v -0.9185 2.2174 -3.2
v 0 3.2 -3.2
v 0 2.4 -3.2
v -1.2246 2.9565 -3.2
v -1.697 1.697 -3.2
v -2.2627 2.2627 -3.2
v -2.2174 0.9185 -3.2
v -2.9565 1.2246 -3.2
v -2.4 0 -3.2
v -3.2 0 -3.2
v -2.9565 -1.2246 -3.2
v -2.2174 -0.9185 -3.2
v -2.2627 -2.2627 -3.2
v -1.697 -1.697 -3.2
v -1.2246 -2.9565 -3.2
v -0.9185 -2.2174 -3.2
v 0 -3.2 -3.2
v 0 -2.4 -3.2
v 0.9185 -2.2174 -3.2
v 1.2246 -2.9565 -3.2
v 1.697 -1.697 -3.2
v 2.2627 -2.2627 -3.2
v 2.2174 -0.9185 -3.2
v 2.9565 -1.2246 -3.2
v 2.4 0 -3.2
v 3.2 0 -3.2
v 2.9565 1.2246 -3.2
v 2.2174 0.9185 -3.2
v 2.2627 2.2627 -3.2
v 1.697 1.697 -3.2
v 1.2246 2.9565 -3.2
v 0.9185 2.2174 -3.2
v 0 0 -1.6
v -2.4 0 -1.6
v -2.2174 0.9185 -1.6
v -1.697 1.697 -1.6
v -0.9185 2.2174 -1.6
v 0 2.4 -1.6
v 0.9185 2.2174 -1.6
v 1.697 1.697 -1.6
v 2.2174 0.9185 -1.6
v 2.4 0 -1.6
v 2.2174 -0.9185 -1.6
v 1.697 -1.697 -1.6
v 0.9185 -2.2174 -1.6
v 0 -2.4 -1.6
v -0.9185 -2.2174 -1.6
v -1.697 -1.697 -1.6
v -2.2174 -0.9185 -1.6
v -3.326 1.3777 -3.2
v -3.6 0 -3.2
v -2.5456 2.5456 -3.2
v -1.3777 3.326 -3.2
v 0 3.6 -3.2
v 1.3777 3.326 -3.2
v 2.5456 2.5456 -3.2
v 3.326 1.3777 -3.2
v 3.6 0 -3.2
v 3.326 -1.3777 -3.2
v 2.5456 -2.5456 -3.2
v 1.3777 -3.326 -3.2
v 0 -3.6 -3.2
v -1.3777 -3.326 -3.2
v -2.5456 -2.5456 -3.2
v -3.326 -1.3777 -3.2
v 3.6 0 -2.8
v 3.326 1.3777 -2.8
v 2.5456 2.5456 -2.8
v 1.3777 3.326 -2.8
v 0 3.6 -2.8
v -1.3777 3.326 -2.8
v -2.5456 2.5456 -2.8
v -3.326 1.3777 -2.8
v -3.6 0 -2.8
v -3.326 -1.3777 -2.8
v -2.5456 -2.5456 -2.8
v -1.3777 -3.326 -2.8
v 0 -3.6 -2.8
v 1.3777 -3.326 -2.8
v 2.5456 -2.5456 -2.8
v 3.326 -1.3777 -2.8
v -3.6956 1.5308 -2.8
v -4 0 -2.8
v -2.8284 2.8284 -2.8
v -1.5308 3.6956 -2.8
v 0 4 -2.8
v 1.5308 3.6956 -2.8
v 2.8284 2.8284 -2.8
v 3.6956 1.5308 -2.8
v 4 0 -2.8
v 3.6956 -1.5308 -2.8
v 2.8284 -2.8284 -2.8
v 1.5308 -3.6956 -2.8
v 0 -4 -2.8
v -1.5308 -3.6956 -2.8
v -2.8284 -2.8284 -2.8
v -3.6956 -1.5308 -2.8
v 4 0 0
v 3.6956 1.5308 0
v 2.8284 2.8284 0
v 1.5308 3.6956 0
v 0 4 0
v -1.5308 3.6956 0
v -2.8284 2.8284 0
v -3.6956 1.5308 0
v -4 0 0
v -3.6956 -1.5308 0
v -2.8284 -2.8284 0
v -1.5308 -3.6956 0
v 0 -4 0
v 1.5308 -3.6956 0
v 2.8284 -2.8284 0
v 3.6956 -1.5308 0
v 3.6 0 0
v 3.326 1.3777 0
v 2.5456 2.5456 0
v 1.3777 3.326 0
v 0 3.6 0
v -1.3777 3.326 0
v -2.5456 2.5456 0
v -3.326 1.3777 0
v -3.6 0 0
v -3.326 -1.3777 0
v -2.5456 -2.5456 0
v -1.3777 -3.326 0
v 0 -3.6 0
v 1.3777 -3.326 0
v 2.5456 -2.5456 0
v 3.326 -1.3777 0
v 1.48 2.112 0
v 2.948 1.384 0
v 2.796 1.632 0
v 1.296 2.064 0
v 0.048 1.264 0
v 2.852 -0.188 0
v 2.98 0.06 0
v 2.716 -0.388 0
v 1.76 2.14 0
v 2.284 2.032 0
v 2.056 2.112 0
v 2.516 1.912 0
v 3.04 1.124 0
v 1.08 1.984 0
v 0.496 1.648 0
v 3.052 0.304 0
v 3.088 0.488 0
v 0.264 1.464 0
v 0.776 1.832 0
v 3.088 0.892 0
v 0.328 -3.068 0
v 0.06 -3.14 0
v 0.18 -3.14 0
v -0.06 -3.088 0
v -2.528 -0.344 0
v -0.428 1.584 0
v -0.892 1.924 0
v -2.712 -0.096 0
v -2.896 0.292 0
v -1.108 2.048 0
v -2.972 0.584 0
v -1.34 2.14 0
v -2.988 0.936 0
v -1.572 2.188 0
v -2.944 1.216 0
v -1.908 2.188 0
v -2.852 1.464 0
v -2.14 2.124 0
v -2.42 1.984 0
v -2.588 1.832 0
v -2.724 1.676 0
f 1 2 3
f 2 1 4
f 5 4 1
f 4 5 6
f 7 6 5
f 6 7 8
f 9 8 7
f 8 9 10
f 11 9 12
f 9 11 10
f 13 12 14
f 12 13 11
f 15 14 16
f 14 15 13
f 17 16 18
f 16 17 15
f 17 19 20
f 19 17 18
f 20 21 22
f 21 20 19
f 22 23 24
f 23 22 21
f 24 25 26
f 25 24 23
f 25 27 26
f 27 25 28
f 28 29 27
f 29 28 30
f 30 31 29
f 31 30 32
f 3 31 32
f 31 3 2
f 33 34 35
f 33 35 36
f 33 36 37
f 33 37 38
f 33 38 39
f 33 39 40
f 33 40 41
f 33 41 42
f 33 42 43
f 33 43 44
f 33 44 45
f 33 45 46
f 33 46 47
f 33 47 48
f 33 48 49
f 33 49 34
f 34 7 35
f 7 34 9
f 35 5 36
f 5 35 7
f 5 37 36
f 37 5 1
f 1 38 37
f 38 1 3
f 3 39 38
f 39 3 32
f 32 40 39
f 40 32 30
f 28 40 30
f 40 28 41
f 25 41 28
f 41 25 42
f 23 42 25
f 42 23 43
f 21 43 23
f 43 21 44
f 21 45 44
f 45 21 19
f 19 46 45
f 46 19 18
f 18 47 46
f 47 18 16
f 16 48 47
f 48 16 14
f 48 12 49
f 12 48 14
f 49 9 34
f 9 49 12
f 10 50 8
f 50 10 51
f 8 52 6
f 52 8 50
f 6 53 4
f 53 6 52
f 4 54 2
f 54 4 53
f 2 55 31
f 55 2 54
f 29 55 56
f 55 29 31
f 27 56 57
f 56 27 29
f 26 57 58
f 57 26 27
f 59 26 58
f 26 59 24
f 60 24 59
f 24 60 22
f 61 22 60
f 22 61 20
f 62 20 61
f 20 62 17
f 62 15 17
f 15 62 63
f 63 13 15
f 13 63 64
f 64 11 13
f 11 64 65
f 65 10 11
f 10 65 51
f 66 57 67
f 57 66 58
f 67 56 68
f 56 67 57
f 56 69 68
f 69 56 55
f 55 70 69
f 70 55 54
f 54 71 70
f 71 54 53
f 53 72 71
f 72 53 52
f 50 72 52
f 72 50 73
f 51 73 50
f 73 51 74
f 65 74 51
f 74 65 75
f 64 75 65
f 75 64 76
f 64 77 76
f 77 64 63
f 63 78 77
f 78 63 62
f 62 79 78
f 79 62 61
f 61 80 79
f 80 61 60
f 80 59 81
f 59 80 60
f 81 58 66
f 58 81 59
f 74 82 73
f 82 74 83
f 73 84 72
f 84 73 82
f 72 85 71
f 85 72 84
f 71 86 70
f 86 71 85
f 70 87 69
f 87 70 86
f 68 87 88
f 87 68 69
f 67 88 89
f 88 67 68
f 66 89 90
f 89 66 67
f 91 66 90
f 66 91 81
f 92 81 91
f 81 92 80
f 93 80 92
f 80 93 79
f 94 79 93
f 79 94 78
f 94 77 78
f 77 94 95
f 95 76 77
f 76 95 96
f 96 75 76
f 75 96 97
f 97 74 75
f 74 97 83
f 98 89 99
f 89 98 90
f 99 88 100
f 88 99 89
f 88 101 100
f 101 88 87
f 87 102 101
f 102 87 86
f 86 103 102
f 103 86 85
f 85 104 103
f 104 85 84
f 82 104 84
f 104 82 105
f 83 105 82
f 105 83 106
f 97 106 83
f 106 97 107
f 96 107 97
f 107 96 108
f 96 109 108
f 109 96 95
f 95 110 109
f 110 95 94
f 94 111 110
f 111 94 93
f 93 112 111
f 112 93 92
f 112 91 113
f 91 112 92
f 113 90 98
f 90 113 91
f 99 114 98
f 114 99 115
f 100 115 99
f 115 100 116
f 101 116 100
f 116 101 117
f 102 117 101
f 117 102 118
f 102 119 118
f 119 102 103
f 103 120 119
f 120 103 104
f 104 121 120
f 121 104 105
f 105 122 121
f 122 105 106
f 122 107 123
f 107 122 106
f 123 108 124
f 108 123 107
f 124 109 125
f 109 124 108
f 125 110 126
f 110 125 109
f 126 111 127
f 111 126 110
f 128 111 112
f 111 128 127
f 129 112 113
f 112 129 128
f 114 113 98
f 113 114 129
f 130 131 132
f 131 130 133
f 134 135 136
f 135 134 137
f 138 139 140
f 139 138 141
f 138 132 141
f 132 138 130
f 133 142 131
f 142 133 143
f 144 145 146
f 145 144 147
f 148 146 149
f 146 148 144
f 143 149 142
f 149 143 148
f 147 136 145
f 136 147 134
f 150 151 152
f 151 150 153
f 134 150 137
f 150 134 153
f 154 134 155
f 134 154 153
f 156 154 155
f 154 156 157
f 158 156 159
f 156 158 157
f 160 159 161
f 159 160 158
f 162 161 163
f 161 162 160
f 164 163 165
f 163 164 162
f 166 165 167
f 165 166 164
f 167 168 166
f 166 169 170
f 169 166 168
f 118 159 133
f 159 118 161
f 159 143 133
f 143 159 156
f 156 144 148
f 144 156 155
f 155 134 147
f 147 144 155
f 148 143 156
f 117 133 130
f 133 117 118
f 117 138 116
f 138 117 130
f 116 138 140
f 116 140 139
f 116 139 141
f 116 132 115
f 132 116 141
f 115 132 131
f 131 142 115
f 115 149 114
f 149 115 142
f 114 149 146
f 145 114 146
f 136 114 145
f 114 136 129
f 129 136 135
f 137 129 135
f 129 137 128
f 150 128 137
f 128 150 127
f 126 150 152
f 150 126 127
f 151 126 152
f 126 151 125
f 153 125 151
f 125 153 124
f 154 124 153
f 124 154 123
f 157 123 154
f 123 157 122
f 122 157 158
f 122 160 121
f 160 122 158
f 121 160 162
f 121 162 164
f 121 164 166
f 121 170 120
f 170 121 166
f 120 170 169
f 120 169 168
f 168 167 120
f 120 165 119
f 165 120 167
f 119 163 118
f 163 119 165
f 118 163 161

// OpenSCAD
// file: ../p/4-4disc.scad
use <../lib.scad>
function ldraw_lib__4_4disc() = [
// 0 Disc 1.0
// 0 Name: 4-4disc.dat
// 0 Author: James Jessiman
// 0 !LDRAW_ORG Primitive UPDATE 2002-02
// 0 !LICENSE Licensed under CC BY 4.0 : see CAreadme.txt
// 
// 0 BFC CERTIFY CCW
  [0,"BFC","CERTIFY"],
  [0,"BFC","CCW"],
// 
// 0 !HISTORY 1998-12-15 [PTadmin] Official Update 1998-10
// 0 !HISTORY 2002-03-23 [sbliss] Added BFC statement
// 0 !HISTORY 2002-04-25 [PTadmin] Official Update 2002-02
// 0 !HISTORY 2007-06-24 [PTadmin] Header formatted for Contributor Agreement
// 0 !HISTORY 2008-07-01 [PTadmin] Official Update 2008-01
// 
// 
// 3 16 0 0 0 1 0 0 0.9239 0 0.3827
  [3,16,0,0,0,1,0,0,0.9239,0,0.3827],
// 3 16 0 0 0 0.9239 0 0.3827 0.7071 0 0.7071
  [3,16,0,0,0,0.9239,0,0.3827,0.7071,0,0.7071],
// 3 16 0 0 0 0.7071 0 0.7071 0.3827 0 0.9239
  [3,16,0,0,0,0.7071,0,0.7071,0.3827,0,0.9239],
// 3 16 0 0 0 0.3827 0 0.9239 0 0 1
  [3,16,0,0,0,0.3827,0,0.9239,0,0,1],
// 3 16 0 0 0 0 0 1 -0.3827 0 0.9239
  [3,16,0,0,0,0,0,1,-0.3827,0,0.9239],
// 3 16 0 0 0 -0.3827 0 0.9239 -0.7071 0 0.7071
  [3,16,0,0,0,-0.3827,0,0.9239,-0.7071,0,0.7071],
// 3 16 0 0 0 -0.7071 0 0.7071 -0.9239 0 0.3827
  [3,16,0,0,0,-0.7071,0,0.7071,-0.9239,0,0.3827],
// 3 16 0 0 0 -0.9239 0 0.3827 -1 0 -0
  [3,16,0,0,0,-0.9239,0,0.3827,-1,0,-0],
// 3 16 0 0 0 -1 0 -0 -0.9239 0 -0.3827
  [3,16,0,0,0,-1,0,-0,-0.9239,0,-0.3827],
// 3 16 0 0 0 -0.9239 0 -0.3827 -0.7071 0 -0.7071
  [3,16,0,0,0,-0.9239,0,-0.3827,-0.7071,0,-0.7071],
// 3 16 0 0 0 -0.7071 0 -0.7071 -0.3827 0 -0.9239
  [3,16,0,0,0,-0.7071,0,-0.7071,-0.3827,0,-0.9239],
// 3 16 0 0 0 -0.3827 0 -0.9239 0 0 -1
  [3,16,0,0,0,-0.3827,0,-0.9239,0,0,-1],
// 3 16 0 0 0 0 0 -1 0.3827 0 -0.9239
  [3,16,0,0,0,0,0,-1,0.3827,0,-0.9239],
// 3 16 0 0 0 0.3827 0 -0.9239 0.7071 0 -0.7071
  [3,16,0,0,0,0.3827,0,-0.9239,0.7071,0,-0.7071],
// 3 16 0 0 0 0.7071 0 -0.7071 0.9239 0 -0.3827
  [3,16,0,0,0,0.7071,0,-0.7071,0.9239,0,-0.3827],
// 3 16 0 0 0 0.9239 0 -0.3827 1 0 0
  [3,16,0,0,0,0.9239,0,-0.3827,1,0,0],
// 0
];
module ldraw_lib__4_4disc(step=0, col=false, unit=2/5, alt=false, line=0.2, solid=!$preview)
    makepoly(ldraw_lib__4_4disc(), step=step, col=col, unit=unit, alt=alt, line=line, solid=solid);
ldraw_lib__4_4disc(line=0.2);
// file: ../p/4-4ring3.scad
use <../lib.scad>
function ldraw_lib__4_4ring3() = [
// 0 Ring  3 x 1.0
// 0 Name: 4-4ring3.dat
// 0 Author: James Jessiman
// 0 !LDRAW_ORG Primitive UPDATE 2009-01
// 0 !LICENSE Licensed under CC BY 4.0 : see CAreadme.txt
// 
// 0 BFC CERTIFY CCW
  [0,"BFC","CERTIFY"],
  [0,"BFC","CCW"],
// 
// 0 !HISTORY 1998-12-15 [PTadmin] Official Update 1998-10
// 0 !HISTORY 2002-04-05 [hafhead] Added BFC statement
// 0 !HISTORY 2002-04-25 [PTadmin] Official Update 2002-02
// 0 !HISTORY 2007-06-24 [PTadmin] Header formatted for Contributor Agreement
// 0 !HISTORY 2008-07-01 [PTadmin] Official Update 2008-01
// 0 !HISTORY 2008-08-26 [cwdee] Switch polygon winding and rename
// 0 !HISTORY 2009-05-02 [PTadmin] Official Update 2009-01
// 
// 
// 4 16 -1.5308 0 3.6956 -1.1481 0 2.7717 0 0 3 0 0 4
  [4,16,-1.5308,0,3.6956,-1.1481,0,2.7717,0,0,3,0,0,4],
// 4 16 -2.8284 0 2.8284 -2.1213 0 2.1213 -1.1481 0 2.7717 -1.5308 0 3.6956
  [4,16,-2.8284,0,2.8284,-2.1213,0,2.1213,-1.1481,0,2.7717,-1.5308,0,3.6956],
// 4 16 -3.6956 0 1.5308 -2.7717 0 1.1481 -2.1213 0 2.1213 -2.8284 0 2.8284
  [4,16,-3.6956,0,1.5308,-2.7717,0,1.1481,-2.1213,0,2.1213,-2.8284,0,2.8284],
// 4 16 -4 0 0 -3 0 0 -2.7717 0 1.1481 -3.6956 0 1.5308
  [4,16,-4,0,0,-3,0,0,-2.7717,0,1.1481,-3.6956,0,1.5308],
// 4 16 -3.6956 0 -1.5308 -2.7717 0 -1.1481 -3 0 0 -4 0 0
  [4,16,-3.6956,0,-1.5308,-2.7717,0,-1.1481,-3,0,0,-4,0,0],
// 4 16 -2.8284 0 -2.8284 -2.1213 0 -2.1213 -2.7717 0 -1.1481 -3.6956 0 -1.5308
  [4,16,-2.8284,0,-2.8284,-2.1213,0,-2.1213,-2.7717,0,-1.1481,-3.6956,0,-1.5308],
// 4 16 -1.5308 0 -3.6956 -1.1481 0 -2.7717 -2.1213 0 -2.1213 -2.8284 0 -2.8284
  [4,16,-1.5308,0,-3.6956,-1.1481,0,-2.7717,-2.1213,0,-2.1213,-2.8284,0,-2.8284],
// 4 16 0 0 -4 0 0 -3 -1.1481 0 -2.7717 -1.5308 0 -3.6956
  [4,16,0,0,-4,0,0,-3,-1.1481,0,-2.7717,-1.5308,0,-3.6956],
// 4 16 1.5308 0 -3.6956 1.1481 0 -2.7717 0 0 -3 0 0 -4
  [4,16,1.5308,0,-3.6956,1.1481,0,-2.7717,0,0,-3,0,0,-4],
// 4 16 2.8284 0 -2.8284 2.1213 0 -2.1213 1.1481 0 -2.7717 1.5308 0 -3.6956
  [4,16,2.8284,0,-2.8284,2.1213,0,-2.1213,1.1481,0,-2.7717,1.5308,0,-3.6956],
// 4 16 3.6956 0 -1.5308 2.7717 0 -1.1481 2.1213 0 -2.1213 2.8284 0 -2.8284
  [4,16,3.6956,0,-1.5308,2.7717,0,-1.1481,2.1213,0,-2.1213,2.8284,0,-2.8284],
// 4 16 4 0 0 3 0 0 2.7717 0 -1.1481 3.6956 0 -1.5308
  [4,16,4,0,0,3,0,0,2.7717,0,-1.1481,3.6956,0,-1.5308],
// 4 16 3.6956 0 1.5308 2.7717 0 1.1481 3 0 0 4 0 0
  [4,16,3.6956,0,1.5308,2.7717,0,1.1481,3,0,0,4,0,0],
// 4 16 2.8284 0 2.8284 2.1213 0 2.1213 2.7717 0 1.1481 3.6956 0 1.5308
  [4,16,2.8284,0,2.8284,2.1213,0,2.1213,2.7717,0,1.1481,3.6956,0,1.5308],
// 4 16 1.5308 0 3.6956 1.1481 0 2.7717 2.1213 0 2.1213 2.8284 0 2.8284
  [4,16,1.5308,0,3.6956,1.1481,0,2.7717,2.1213,0,2.1213,2.8284,0,2.8284],
// 4 16 0 0 4 0 0 3 1.1481 0 2.7717 1.5308 0 3.6956
  [4,16,0,0,4,0,0,3,1.1481,0,2.7717,1.5308,0,3.6956],
// 0
];
module ldraw_lib__4_4ring3(step=0, col=false, unit=2/5, alt=false, line=0.2, solid=!$preview)
    makepoly(ldraw_lib__4_4ring3(), step=step, col=col, unit=unit, alt=alt, line=line, solid=solid);
ldraw_lib__4_4ring3(line=0.2);
// file: ../p/4-4cylc.scad
use <../lib.scad>
use <4-4cyli.scad>
use <4-4disc.scad>
use <4-4edge.scad>
function ldraw_lib__4_4cylc() = [
// 0 Cylinder Closed 1.0
// 0 Name: 4-4cylc.dat
// 0 Author: Alex Taylor [anathema]
// 0 !LDRAW_ORG Primitive UPDATE 2009-02
// 0 !LICENSE Licensed under CC BY 4.0 : see CAreadme.txt
// 
// 0 BFC CERTIFY CCW
  [0,"BFC","CERTIFY"],
  [0,"BFC","CCW"],
// 
// 0 !HISTORY 2008-12-29 [cwdee] Removed one disc
// 0 !HISTORY 2009-09-03 [PTadmin] Official Update 2009-02
// 
// 
// 1 16 0 0 0 1 0 0 0 1 0 0 0 1 4-4edge.dat
  [1,16,0,0,0,1,0,0,0,1,0,0,0,1, ldraw_lib__4_4edge()],
// 1 16 0 1 0 1 0 0 0 1 0 0 0 1 4-4edge.dat
  [1,16,0,1,0,1,0,0,0,1,0,0,0,1, ldraw_lib__4_4edge()],
// 1 16 0 0 0 1 0 0 0 1 0 0 0 1 4-4disc.dat
  [1,16,0,0,0,1,0,0,0,1,0,0,0,1, ldraw_lib__4_4disc()],
// 1 16 0 0 0 1 0 0 0 1 0 0 0 1 4-4cyli.dat
  [1,16,0,0,0,1,0,0,0,1,0,0,0,1, ldraw_lib__4_4cyli()],
// 0
];
module ldraw_lib__4_4cylc(step=0, col=false, unit=2/5, alt=false, line=0.2, solid=!$preview)
    makepoly(ldraw_lib__4_4cylc(), step=step, col=col, unit=unit, alt=alt, line=line, solid=solid);
ldraw_lib__4_4cylc(line=0.2);
// file: ../p/4-4edge.scad
use <../lib.scad>
function ldraw_lib__4_4edge() = [
// 0 Circle 1.0
// 0 Name: 4-4edge.dat
// 0 Author: James Jessiman
// 0 !LDRAW_ORG Primitive UPDATE 2017-01
// 0 !LICENSE Licensed under CC BY 4.0 : see CAreadme.txt
// 
// 0 BFC CERTIFY CCW
  [0,"BFC","CERTIFY"],
  [0,"BFC","CCW"],
// 
// 0 !HISTORY 1998-12-15 [PTadmin] Official Update 1998-10
// 0 !HISTORY 2005-12-28 [PTadmin] Official Update 2005-01
// 0 !HISTORY 2007-06-24 [PTadmin] Header formatted for Contributor Agreement
// 0 !HISTORY 2008-07-01 [PTadmin] Official Update 2008-01
// 0 !HISTORY 2017-01-15 [Steffen] BFCed
// 0 !HISTORY 2017-12-30 [PTadmin] Official Update 2017-01
// 
// 
// 2 24 1 0 0 0.9239 0 0.3827
  [2,24,1,0,0,0.9239,0,0.3827],
// 2 24 0.9239 0 0.3827 0.7071 0 0.7071
  [2,24,0.9239,0,0.3827,0.7071,0,0.7071],
// 2 24 0.7071 0 0.7071 0.3827 0 0.9239
  [2,24,0.7071,0,0.7071,0.3827,0,0.9239],
// 2 24 0.3827 0 0.9239 0 0 1
  [2,24,0.3827,0,0.9239,0,0,1],
// 2 24 0 0 1 -0.3827 0 0.9239
  [2,24,0,0,1,-0.3827,0,0.9239],
// 2 24 -0.3827 0 0.9239 -0.7071 0 0.7071
  [2,24,-0.3827,0,0.9239,-0.7071,0,0.7071],
// 2 24 -0.7071 0 0.7071 -0.9239 0 0.3827
  [2,24,-0.7071,0,0.7071,-0.9239,0,0.3827],
// 2 24 -0.9239 0 0.3827 -1 0 -0
  [2,24,-0.9239,0,0.3827,-1,0,-0],
// 2 24 -1 0 -0 -0.9239 0 -0.3827
  [2,24,-1,0,-0,-0.9239,0,-0.3827],
// 2 24 -0.9239 0 -0.3827 -0.7071 0 -0.7071
  [2,24,-0.9239,0,-0.3827,-0.7071,0,-0.7071],
// 2 24 -0.7071 0 -0.7071 -0.3827 0 -0.9239
  [2,24,-0.7071,0,-0.7071,-0.3827,0,-0.9239],
// 2 24 -0.3827 0 -0.9239 0 0 -1
  [2,24,-0.3827,0,-0.9239,0,0,-1],
// 2 24 0 0 -1 0.3827 0 -0.9239
  [2,24,0,0,-1,0.3827,0,-0.9239],
// 2 24 0.3827 0 -0.9239 0.7071 0 -0.7071
  [2,24,0.3827,0,-0.9239,0.7071,0,-0.7071],
// 2 24 0.7071 0 -0.7071 0.9239 0 -0.3827
  [2,24,0.7071,0,-0.7071,0.9239,0,-0.3827],
// 2 24 0.9239 0 -0.3827 1 0 0
  [2,24,0.9239,0,-0.3827,1,0,0],
];
module ldraw_lib__4_4edge(step=0, col=false, unit=2/5, alt=false, line=0.2, solid=!$preview)
    makepoly(ldraw_lib__4_4edge(), step=step, col=col, unit=unit, alt=alt, line=line, solid=solid);
ldraw_lib__4_4edge(line=0.2);
// file: ../p/4-4cyli.scad
use <../lib.scad>
function ldraw_lib__4_4cyli() = [
// 0 Cylinder 1.0
// 0 Name: 4-4cyli.dat
// 0 Author: James Jessiman
// 0 !LDRAW_ORG Primitive UPDATE 2005-01
// 0 !LICENSE Licensed under CC BY 4.0 : see CAreadme.txt
// 
// 0 BFC CERTIFY CCW
  [0,"BFC","CERTIFY"],
  [0,"BFC","CCW"],
// 
// 0 !HISTORY 1998-12-15 [PTadmin] Official Update 1998-10
// 0 !HISTORY 2002-03-23 [sbliss] Added BFC statement; merged headers from files in distributions LDraw 0.27 and Complete.
// 0 !HISTORY 2002-04-25 [PTadmin] Official Update 2002-02
// 0 !HISTORY 2004-12-14 [guyvivan] BFC CCW
// 0 !HISTORY 2005-12-28 [PTadmin] Official Update 2005-01
// 0 !HISTORY 2007-06-24 [PTadmin] Header formatted for Contributor Agreement
// 0 !HISTORY 2008-07-01 [PTadmin] Official Update 2008-01
// 
// 
// 4 16 1 1 0 0.9239 1 0.3827 0.9239 0 0.3827 1 0 0
  [4,16,1,1,0,0.9239,1,0.3827,0.9239,0,0.3827,1,0,0],
// 5 24 1 0 0 1 1 0 0.9239 0 0.3827 0.9239 0 -0.3827
  [5,24,1,0,0,1,1,0,0.9239,0,0.3827,0.9239,0,-0.3827],
// 4 16 0.9239 1 0.3827 0.7071 1 0.7071 0.7071 0 0.7071 0.9239 0 0.3827
  [4,16,0.9239,1,0.3827,0.7071,1,0.7071,0.7071,0,0.7071,0.9239,0,0.3827],
// 5 24 0.9239 0 0.3827 0.9239 1 0.3827 0.7071 0 0.7071 1 0 0
  [5,24,0.9239,0,0.3827,0.9239,1,0.3827,0.7071,0,0.7071,1,0,0],
// 4 16 0.7071 1 0.7071 0.3827 1 0.9239 0.3827 0 0.9239 0.7071 0 0.7071
  [4,16,0.7071,1,0.7071,0.3827,1,0.9239,0.3827,0,0.9239,0.7071,0,0.7071],
// 5 24 0.7071 0 0.7071 0.7071 1 0.7071 0.3827 0 0.9239 0.9239 0 0.3827
  [5,24,0.7071,0,0.7071,0.7071,1,0.7071,0.3827,0,0.9239,0.9239,0,0.3827],
// 4 16 0.3827 1 0.9239 0 1 1 0 0 1 0.3827 0 0.9239
  [4,16,0.3827,1,0.9239,0,1,1,0,0,1,0.3827,0,0.9239],
// 5 24 0.3827 0 0.9239 0.3827 1 0.9239 0 0 1 0.7071 0 0.7071
  [5,24,0.3827,0,0.9239,0.3827,1,0.9239,0,0,1,0.7071,0,0.7071],
// 4 16 0 1 1 -0.3827 1 0.9239 -0.3827 0 0.9239 0 0 1
  [4,16,0,1,1,-0.3827,1,0.9239,-0.3827,0,0.9239,0,0,1],
// 5 24 0 0 1 0 1 1 -0.3827 0 0.9239 0.3827 0 0.9239
  [5,24,0,0,1,0,1,1,-0.3827,0,0.9239,0.3827,0,0.9239],
// 4 16 -0.3827 1 0.9239 -0.7071 1 0.7071 -0.7071 0 0.7071 -0.3827 0 0.9239
  [4,16,-0.3827,1,0.9239,-0.7071,1,0.7071,-0.7071,0,0.7071,-0.3827,0,0.9239],
// 5 24 -0.3827 0 0.9239 -0.3827 1 0.9239 -0.7071 0 0.7071 0 0 1
  [5,24,-0.3827,0,0.9239,-0.3827,1,0.9239,-0.7071,0,0.7071,0,0,1],
// 4 16 -0.7071 1 0.7071 -0.9239 1 0.3827 -0.9239 0 0.3827 -0.7071 0 0.7071
  [4,16,-0.7071,1,0.7071,-0.9239,1,0.3827,-0.9239,0,0.3827,-0.7071,0,0.7071],
// 5 24 -0.7071 0 0.7071 -0.7071 1 0.7071 -0.9239 0 0.3827 -0.3827 0 0.9239
  [5,24,-0.7071,0,0.7071,-0.7071,1,0.7071,-0.9239,0,0.3827,-0.3827,0,0.9239],
// 4 16 -0.9239 1 0.3827 -1 1 0 -1 0 0 -0.9239 0 0.3827
  [4,16,-0.9239,1,0.3827,-1,1,0,-1,0,0,-0.9239,0,0.3827],
// 5 24 -0.9239 0 0.3827 -0.9239 1 0.3827 -1 0 0 -0.7071 0 0.7071
  [5,24,-0.9239,0,0.3827,-0.9239,1,0.3827,-1,0,0,-0.7071,0,0.7071],
// 4 16 -1 1 0 -0.9239 1 -0.3827 -0.9239 0 -0.3827 -1 0 0
  [4,16,-1,1,0,-0.9239,1,-0.3827,-0.9239,0,-0.3827,-1,0,0],
// 5 24 -1 0 0 -1 1 0 -0.9239 0 -0.3827 -0.9239 0 0.3827
  [5,24,-1,0,0,-1,1,0,-0.9239,0,-0.3827,-0.9239,0,0.3827],
// 4 16 -0.9239 1 -0.3827 -0.7071 1 -0.7071 -0.7071 0 -0.7071 -0.9239 0 -0.3827
  [4,16,-0.9239,1,-0.3827,-0.7071,1,-0.7071,-0.7071,0,-0.7071,-0.9239,0,-0.3827],
// 5 24 -0.9239 0 -0.3827 -0.9239 1 -0.3827 -0.7071 0 -0.7071 -1 0 0
  [5,24,-0.9239,0,-0.3827,-0.9239,1,-0.3827,-0.7071,0,-0.7071,-1,0,0],
// 4 16 -0.7071 1 -0.7071 -0.3827 1 -0.9239 -0.3827 0 -0.9239 -0.7071 0 -0.7071
  [4,16,-0.7071,1,-0.7071,-0.3827,1,-0.9239,-0.3827,0,-0.9239,-0.7071,0,-0.7071],
// 5 24 -0.7071 0 -0.7071 -0.7071 1 -0.7071 -0.3827 0 -0.9239 -0.9239 0 -0.3827
  [5,24,-0.7071,0,-0.7071,-0.7071,1,-0.7071,-0.3827,0,-0.9239,-0.9239,0,-0.3827],
// 4 16 -0.3827 1 -0.9239 0 1 -1 0 0 -1 -0.3827 0 -0.9239
  [4,16,-0.3827,1,-0.9239,0,1,-1,0,0,-1,-0.3827,0,-0.9239],
// 5 24 -0.3827 0 -0.9239 -0.3827 1 -0.9239 0 0 -1 -0.7071 0 -0.7071
  [5,24,-0.3827,0,-0.9239,-0.3827,1,-0.9239,0,0,-1,-0.7071,0,-0.7071],
// 4 16 0 1 -1 0.3827 1 -0.9239 0.3827 0 -0.9239 0 0 -1
  [4,16,0,1,-1,0.3827,1,-0.9239,0.3827,0,-0.9239,0,0,-1],
// 5 24 0 0 -1 0 1 -1 0.3827 0 -0.9239 -0.3827 0 -0.9239
  [5,24,0,0,-1,0,1,-1,0.3827,0,-0.9239,-0.3827,0,-0.9239],
// 4 16 0.3827 1 -0.9239 0.7071 1 -0.7071 0.7071 0 -0.7071 0.3827 0 -0.9239
  [4,16,0.3827,1,-0.9239,0.7071,1,-0.7071,0.7071,0,-0.7071,0.3827,0,-0.9239],
// 5 24 0.3827 0 -0.9239 0.3827 1 -0.9239 0.7071 0 -0.7071 0 0 -1
  [5,24,0.3827,0,-0.9239,0.3827,1,-0.9239,0.7071,0,-0.7071,0,0,-1],
// 4 16 0.7071 1 -0.7071 0.9239 1 -0.3827 0.9239 0 -0.3827 0.7071 0 -0.7071
  [4,16,0.7071,1,-0.7071,0.9239,1,-0.3827,0.9239,0,-0.3827,0.7071,0,-0.7071],
// 5 24 0.7071 0 -0.7071 0.7071 1 -0.7071 0.9239 0 -0.3827 0.3827 0 -0.9239
  [5,24,0.7071,0,-0.7071,0.7071,1,-0.7071,0.9239,0,-0.3827,0.3827,0,-0.9239],
// 4 16 0.9239 1 -0.3827 1 1 0 1 0 0 0.9239 0 -0.3827
  [4,16,0.9239,1,-0.3827,1,1,0,1,0,0,0.9239,0,-0.3827],
// 5 24 0.9239 0 -0.3827 0.9239 1 -0.3827 1 0 0 0.7071 0 -0.7071
  [5,24,0.9239,0,-0.3827,0.9239,1,-0.3827,1,0,0,0.7071,0,-0.7071],
// 0
];
module ldraw_lib__4_4cyli(step=0, col=false, unit=2/5, alt=false, line=0.2, solid=!$preview)
    makepoly(ldraw_lib__4_4cyli(), step=step, col=col, unit=unit, alt=alt, line=line, solid=solid);
ldraw_lib__4_4cyli(line=0.2);
// file: ../p/stud4o.scad
use <../lib.scad>
use <4-4cylc.scad>
use <4-4ring3.scad>
function ldraw_lib__stud4o() = [
// 0 Stud Tube Open without Outer Cylinder
// 0 Name: stud4o.dat
// 0 Author: Magnus Forsberg [MagFors]
// 0 !LDRAW_ORG Primitive UPDATE 2011-02
// 0 !LICENSE Licensed under CC BY 4.0 : see CAreadme.txt
// 
// 0 !HELP This stud is a "antistud" to be used like a underside stud,
// 0 !HELP but without the outer cylinder.
// 0 !HELP 1 47 0 0 0 1 0 0 0 1 0 0 0 1 stud4.dat
// 
// 0 BFC CERTIFY CCW
  [0,"BFC","CERTIFY"],
  [0,"BFC","CCW"],
// 
// 0 !HISTORY 2011-12-29 [PTadmin] Official Update 2011-02
// 
// 
// 1 16 0 -4 0 2 0 0 0 1 0 0 0 2 4-4ring3.dat
  [1,16,0,-4,0,2,0,0,0,1,0,0,0,2, ldraw_lib__4_4ring3()],
// 0 BFC INVERTNEXT
  [0,"BFC","INVERTNEXT"],
// 1 16 0 0 0 -6 0 0 0 -4 0 0 0 6 4-4cylc.dat
  [1,16,0,0,0,-6,0,0,0,-4,0,0,0,6, ldraw_lib__4_4cylc()],
];
module ldraw_lib__stud4o(step=0, col=false, unit=2/5, alt=false, line=0.2, solid=!$preview)
    makepoly(ldraw_lib__stud4o(), step=step, col=col, unit=unit, alt=alt, line=line, solid=solid);
ldraw_lib__stud4o(line=0.2);
// file: ../p/4-4ring8.scad
use <../lib.scad>
function ldraw_lib__4_4ring8() = [
// 0 Ring  8 x 1.0
// 0 Name: 4-4ring8.dat
// 0 Author: Steffen [Steffen]
// 0 !LDRAW_ORG Primitive UPDATE 2012-01
// 0 !LICENSE Licensed under CC BY 4.0 : see CAreadme.txt
// 
// 0 BFC CERTIFY CCW
  [0,"BFC","CERTIFY"],
  [0,"BFC","CCW"],
// 
// 0 !HISTORY 2003-12-19 [PTadmin] Official Update 2003-03
// 0 !HISTORY 2007-06-24 [PTadmin] Header formatted for Contributor Agreement
// 0 !HISTORY 2008-07-01 [PTadmin] Official Update 2008-01
// 0 !HISTORY 2012-02-16 [Philo] Changed to CCW
// 0 !HISTORY 2012-03-30 [PTadmin] Official Update 2012-01
// 
// 
// 4 16 9 0 0 8.3151 0 3.4443 7.3912 0 3.0616 8 0 0
  [4,16,9,0,0,8.3151,0,3.4443,7.3912,0,3.0616,8,0,0],
// 4 16 8.3151 0 3.4443 6.3639 0 6.3639 5.6568 0 5.6568 7.3912 0 3.0616
  [4,16,8.3151,0,3.4443,6.3639,0,6.3639,5.6568,0,5.6568,7.3912,0,3.0616],
// 4 16 6.3639 0 6.3639 3.4443 0 8.3151 3.0616 0 7.3912 5.6568 0 5.6568
  [4,16,6.3639,0,6.3639,3.4443,0,8.3151,3.0616,0,7.3912,5.6568,0,5.6568],
// 4 16 3.4443 0 8.3151 0 0 9 0 0 8 3.0616 0 7.3912
  [4,16,3.4443,0,8.3151,0,0,9,0,0,8,3.0616,0,7.3912],
// 4 16 0 0 9 -3.4443 0 8.3151 -3.0616 0 7.3912 0 0 8
  [4,16,0,0,9,-3.4443,0,8.3151,-3.0616,0,7.3912,0,0,8],
// 4 16 -3.4443 0 8.3151 -6.3639 0 6.3639 -5.6568 0 5.6568 -3.0616 0 7.3912
  [4,16,-3.4443,0,8.3151,-6.3639,0,6.3639,-5.6568,0,5.6568,-3.0616,0,7.3912],
// 4 16 -6.3639 0 6.3639 -8.3151 0 3.4443 -7.3912 0 3.0616 -5.6568 0 5.6568
  [4,16,-6.3639,0,6.3639,-8.3151,0,3.4443,-7.3912,0,3.0616,-5.6568,0,5.6568],
// 4 16 -8.3151 0 3.4443 -9 0 0 -8 0 0 -7.3912 0 3.0616
  [4,16,-8.3151,0,3.4443,-9,0,0,-8,0,0,-7.3912,0,3.0616],
// 4 16 -9 0 0 -8.3151 0 -3.4443 -7.3912 0 -3.0616 -8 0 0
  [4,16,-9,0,0,-8.3151,0,-3.4443,-7.3912,0,-3.0616,-8,0,0],
// 4 16 -8.3151 0 -3.4443 -6.3639 0 -6.3639 -5.6568 0 -5.6568 -7.3912 0 -3.0616
  [4,16,-8.3151,0,-3.4443,-6.3639,0,-6.3639,-5.6568,0,-5.6568,-7.3912,0,-3.0616],
// 4 16 -6.3639 0 -6.3639 -3.4443 0 -8.3151 -3.0616 0 -7.3912 -5.6568 0 -5.6568
  [4,16,-6.3639,0,-6.3639,-3.4443,0,-8.3151,-3.0616,0,-7.3912,-5.6568,0,-5.6568],
// 4 16 -3.4443 0 -8.3151 0 0 -9 0 0 -8 -3.0616 0 -7.3912
  [4,16,-3.4443,0,-8.3151,0,0,-9,0,0,-8,-3.0616,0,-7.3912],
// 4 16 0 0 -9 3.4443 0 -8.3151 3.0616 0 -7.3912 0 0 -8
  [4,16,0,0,-9,3.4443,0,-8.3151,3.0616,0,-7.3912,0,0,-8],
// 4 16 3.4443 0 -8.3151 6.3639 0 -6.3639 5.6568 0 -5.6568 3.0616 0 -7.3912
  [4,16,3.4443,0,-8.3151,6.3639,0,-6.3639,5.6568,0,-5.6568,3.0616,0,-7.3912],
// 4 16 6.3639 0 -6.3639 8.3151 0 -3.4443 7.3912 0 -3.0616 5.6568 0 -5.6568
  [4,16,6.3639,0,-6.3639,8.3151,0,-3.4443,7.3912,0,-3.0616,5.6568,0,-5.6568],
// 4 16 8.3151 0 -3.4443 9 0 0 8 0 0 7.3912 0 -3.0616
  [4,16,8.3151,0,-3.4443,9,0,0,8,0,0,7.3912,0,-3.0616],
];
module ldraw_lib__4_4ring8(step=0, col=false, unit=2/5, alt=false, line=0.2, solid=!$preview)
    makepoly(ldraw_lib__4_4ring8(), step=step, col=col, unit=unit, alt=alt, line=line, solid=solid);
ldraw_lib__4_4ring8(line=0.2);
// file: ../p/4-4cylo.scad
use <../lib.scad>
use <4-4cyli.scad>
use <4-4edge.scad>
function ldraw_lib__4_4cylo() = [
// 0 Cylinder Open 1.0
// 0 Name: 4-4cylo.dat
// 0 Author: Mark Kennedy [mkennedy]
// 0 !LDRAW_ORG Primitive UPDATE 2010-01
// 0 !LICENSE Licensed under CC BY 4.0 : see CAreadme.txt
// 
// 0 BFC CERTIFY CCW
  [0,"BFC","CERTIFY"],
  [0,"BFC","CCW"],
// 
// 0 !HISTORY 2010-04-05 [PTadmin] Official Update 2010-01
// 
// 
// 1 16 0 0 0 1 0 0 0 1 0 0 0 1 4-4edge.dat
  [1,16,0,0,0,1,0,0,0,1,0,0,0,1, ldraw_lib__4_4edge()],
// 1 16 0 1 0 1 0 0 0 1 0 0 0 1 4-4edge.dat
  [1,16,0,1,0,1,0,0,0,1,0,0,0,1, ldraw_lib__4_4edge()],
// 1 16 0 0 0 1 0 0 0 1 0 0 0 1 4-4cyli.dat
  [1,16,0,0,0,1,0,0,0,1,0,0,0,1, ldraw_lib__4_4cyli()],
// 0
];
module ldraw_lib__4_4cylo(step=0, col=false, unit=2/5, alt=false, line=0.2, solid=!$preview)
    makepoly(ldraw_lib__4_4cylo(), step=step, col=col, unit=unit, alt=alt, line=line, solid=solid);
ldraw_lib__4_4cylo(line=0.2);
// file: ../p/empty.scad
use <../lib.scad>
function ldraw_lib__empty() = [
// 0 Empty
// 0 Name: empty.dat
// 0 Author: Steffen [Steffen]
// 0 !LDRAW_ORG Primitive UPDATE 2015-01
// 0 !LICENSE Licensed under CC BY 4.0 : see CAreadme.txt
// 
// 0 BFC CERTIFY CCW
  [0,"BFC","CERTIFY"],
  [0,"BFC","CCW"],
// 
// 0 !HISTORY 2015-10-11 [PTadmin] Official Update 2015-01
// 
// 
// 0 // Tool MLCad cannot handle really empty files. This file is used as a workaround.
// 0 // It exceptionally contains forbidden non-LDRAW standard syntax to satisfy MLCad until it is fixed OR a different editor has become the de-facto LDRAW standard.
// 0 // The line being used here is an "impossible" conditional line which never should be visible,
// 0 // additionally hidden by a syntax explicitly hiding it from displaying.
// 
// 0 MLCAD HIDE 5 24 0 0 0 0.0001 0 0 0.0001 -0.0001 0 0 0 0
];
module ldraw_lib__empty(step=0, col=false, unit=2/5, alt=false, line=0.2, solid=!$preview)
    makepoly(ldraw_lib__empty(), step=step, col=col, unit=unit, alt=alt, line=line, solid=solid);
ldraw_lib__empty(line=0.2);
// file: s/98138s02.scad
use <../../lib.scad>
use <../../p/4-4cylo.scad>
use <../../p/4-4ring8.scad>
use <../../p/4-4ring9.scad>
use <../../p/stud4o.scad>
function ldraw_lib__s__98138s02() = [
// 0 ~Tile  1 x  1 Round with Groove without Complete Top Face
// 0 Name: s\98138s02.dat
// 0 Author: Magnus Forsberg [MagFors]
// 0 !LDRAW_ORG Subpart UPDATE 2020-01
// 0 !LICENSE Licensed under CC BY 4.0 : see CAreadme.txt
// 
// 0 BFC CERTIFY CCW
  [0,"BFC","CERTIFY"],
  [0,"BFC","CCW"],
// 
// 0 !HISTORY 2020-06-28 [PTadmin] Official Update 2020-01
// 
// 
// 1 16 0 4 0 1 0 0 0 -1 0 0 0 1 stud4o.dat
  [1,16,0,4,0,1,0,0,0,-1,0,0,0,1, ldraw_lib__stud4o()],
// 1 16 0 8 0 -1 0 0 0 -1 0 0 0 1 4-4ring8.dat
  [1,16,0,8,0,-1,0,0,0,-1,0,0,0,1, ldraw_lib__4_4ring8()],
// 1 16 0 7 0 9 0 0 0 1 0 0 0 9 4-4cylo.dat
  [1,16,0,7,0,9,0,0,0,1,0,0,0,9, ldraw_lib__4_4cylo()],
// 1 16 0 7 0 -1 0 0 0 -1 0 0 0 1 4-4ring9.dat
  [1,16,0,7,0,-1,0,0,0,-1,0,0,0,1, ldraw_lib__4_4ring9()],
// 1 16 0 0 0 10 0 0 0 7 0 0 0 10 4-4cylo.dat
  [1,16,0,0,0,10,0,0,0,7,0,0,0,10, ldraw_lib__4_4cylo()],
];
module ldraw_lib__s__98138s02(step=0, col=false, unit=2/5, alt=false, line=0.2, solid=!$preview)
    makepoly(ldraw_lib__s__98138s02(), step=step, col=col, unit=unit, alt=alt, line=line, solid=solid);
ldraw_lib__s__98138s02(line=0.2);
// file: ../p/4-4ring9.scad
use <../lib.scad>
function ldraw_lib__4_4ring9() = [
// 0 Ring  9 x 1.0
// 0 Name: 4-4ring9.dat
// 0 Author: Magnus Forsberg [MagFors]
// 0 !LDRAW_ORG Primitive UPDATE 2024-01
// 0 !LICENSE Licensed under CC BY 4.0 : see CAreadme.txt
// 
// 0 BFC CERTIFY CCW
  [0,"BFC","CERTIFY"],
  [0,"BFC","CCW"],
// 
// 0 !HISTORY 2004-04-22 [PTadmin] Official Update 2004-02
// 0 !HISTORY 2007-06-24 [PTadmin] Header formatted for Contributor Agreement
// 0 !HISTORY 2008-07-01 [PTadmin] Official Update 2008-01
// 0 !HISTORY 2024-01-04 [MagFors] Complete regeneration, original by jriley
// 0 !HISTORY 2024-01-29 [OrionP] Official Update 2024-01
// 
// 4 16 10 0 0 9.239 0 3.827 8.3151 0 3.4443 9 0 0
  [4,16,10,0,0,9.239,0,3.827,8.3151,0,3.4443,9,0,0],
// 4 16 9.239 0 3.827 7.071 0 7.071 6.3639 0 6.3639 8.3151 0 3.4443
  [4,16,9.239,0,3.827,7.071,0,7.071,6.3639,0,6.3639,8.3151,0,3.4443],
// 4 16 7.071 0 7.071 3.827 0 9.239 3.4443 0 8.3151 6.3639 0 6.3639
  [4,16,7.071,0,7.071,3.827,0,9.239,3.4443,0,8.3151,6.3639,0,6.3639],
// 4 16 3.827 0 9.239 0 0 10 0 0 9 3.4443 0 8.3151
  [4,16,3.827,0,9.239,0,0,10,0,0,9,3.4443,0,8.3151],
// 4 16 0 0 10 -3.827 0 9.239 -3.4443 0 8.3151 0 0 9
  [4,16,0,0,10,-3.827,0,9.239,-3.4443,0,8.3151,0,0,9],
// 4 16 -3.827 0 9.239 -7.071 0 7.071 -6.3639 0 6.3639 -3.4443 0 8.3151
  [4,16,-3.827,0,9.239,-7.071,0,7.071,-6.3639,0,6.3639,-3.4443,0,8.3151],
// 4 16 -7.071 0 7.071 -9.239 0 3.827 -8.3151 0 3.4443 -6.3639 0 6.3639
  [4,16,-7.071,0,7.071,-9.239,0,3.827,-8.3151,0,3.4443,-6.3639,0,6.3639],
// 4 16 -9.239 0 3.827 -10 0 0 -9 0 0 -8.3151 0 3.4443
  [4,16,-9.239,0,3.827,-10,0,0,-9,0,0,-8.3151,0,3.4443],
// 4 16 -10 0 0 -9.239 0 -3.827 -8.3151 0 -3.4443 -9 0 0
  [4,16,-10,0,0,-9.239,0,-3.827,-8.3151,0,-3.4443,-9,0,0],
// 4 16 -9.239 0 -3.827 -7.071 0 -7.071 -6.3639 0 -6.3639 -8.3151 0 -3.4443
  [4,16,-9.239,0,-3.827,-7.071,0,-7.071,-6.3639,0,-6.3639,-8.3151,0,-3.4443],
// 4 16 -7.071 0 -7.071 -3.827 0 -9.239 -3.4443 0 -8.3151 -6.3639 0 -6.3639
  [4,16,-7.071,0,-7.071,-3.827,0,-9.239,-3.4443,0,-8.3151,-6.3639,0,-6.3639],
// 4 16 -3.827 0 -9.239 0 0 -10 0 0 -9 -3.4443 0 -8.3151
  [4,16,-3.827,0,-9.239,0,0,-10,0,0,-9,-3.4443,0,-8.3151],
// 4 16 0 0 -10 3.827 0 -9.239 3.4443 0 -8.3151 0 0 -9
  [4,16,0,0,-10,3.827,0,-9.239,3.4443,0,-8.3151,0,0,-9],
// 4 16 3.827 0 -9.239 7.071 0 -7.071 6.3639 0 -6.3639 3.4443 0 -8.3151
  [4,16,3.827,0,-9.239,7.071,0,-7.071,6.3639,0,-6.3639,3.4443,0,-8.3151],
// 4 16 7.071 0 -7.071 9.239 0 -3.827 8.3151 0 -3.4443 6.3639 0 -6.3639
  [4,16,7.071,0,-7.071,9.239,0,-3.827,8.3151,0,-3.4443,6.3639,0,-6.3639],
// 4 16 9.239 0 -3.827 10 0 0 9 0 0 8.3151 0 -3.4443
  [4,16,9.239,0,-3.827,10,0,0,9,0,0,8.3151,0,-3.4443],
// 0 // Build by LDPartEditor (PrimGen 2.X)
];
module ldraw_lib__4_4ring9(step=0, col=false, unit=2/5, alt=false, line=0.2, solid=!$preview)
    makepoly(ldraw_lib__4_4ring9(), step=step, col=col, unit=unit, alt=alt, line=line, solid=solid);
ldraw_lib__4_4ring9(line=0.2);
// file: ../p/1-16chrd.scad
use <../lib.scad>
use <empty.scad>
function ldraw_lib__1_16chrd() = [
// 0 Chord 0.0625
// 0 Name: 1-16chrd.dat
// 0 Author: Philippe Hurbain [Philo]
// 0 !LDRAW_ORG Primitive UPDATE 2015-01
// 0 !LICENSE Licensed under CC BY 4.0 : see CAreadme.txt
// 
// 0 BFC CERTIFY CCW
  [0,"BFC","CERTIFY"],
  [0,"BFC","CCW"],
// 
// 0 !HISTORY 2015-10-11 [PTadmin] Official Update 2015-01
// 
// 
// 0 // This file is intentionally empty because at the current \P resolution,
// 0 // an 1-16chrd is actually empty. However, this file still is present
// 0 // to allow tools to do primitives substition and fill in a real chrd here,
// 0 // or, if desired, to substitute this with the hi-res 48\1-16chrd.
// 
// 0 // This file is based on an idea by Darats at http://forums.ldraw.org/read.php?19,14500,14500#msg-14500
// 
// 1 16 0 0 0 1 0 0 0 1 0 0 0 1 empty.dat
  [1,16,0,0,0,1,0,0,0,1,0,0,0,1, ldraw_lib__empty()],
];
module ldraw_lib__1_16chrd(step=0, col=false, unit=2/5, alt=false, line=0.2, solid=!$preview)
    makepoly(ldraw_lib__1_16chrd(), step=step, col=col, unit=unit, alt=alt, line=line, solid=solid);
ldraw_lib__1_16chrd(line=0.2);
// file: s/98138s01.scad
use <../../lib.scad>
use <../../p/4-4ring9.scad>
use <98138s02.scad>
function ldraw_lib__s__98138s01() = [
// 0 ~Tile  1 x  1 Round with Groove with Partial Top Face
// 0 Name: s\98138s01.dat
// 0 Author: Magnus Forsberg [MagFors]
// 0 !LDRAW_ORG Subpart UPDATE 2020-01
// 0 !LICENSE Licensed under CC BY 4.0 : see CAreadme.txt
// 
// 0 BFC CERTIFY CCW
  [0,"BFC","CERTIFY"],
  [0,"BFC","CCW"],
// 
// 0 !HISTORY 2011-12-29 [PTadmin] Official Update 2011-02
// 0 !HISTORY 2016-06-17 [MagFors] Reduced the rounded edge to 0.5 ldu
// 0 !HISTORY 2016-12-31 [PTadmin] Official Update 2016-01
// 0 !HISTORY 2019-06-17 [MagFors] Removed the rounded edge
// 0 !HISTORY 2019-07-19 [MagFors] Subfiled without top surface
// 0 !HISTORY 2020-06-28 [PTadmin] Official Update 2020-01
// 
// 
// 1 16 0 0 0 1 0 0 0 1 0 0 0 1 s\98138s02.dat
  [1,16,0,0,0,1,0,0,0,1,0,0,0,1, ldraw_lib__s__98138s02()],
// 1 16 0 0 0 1 0 0 0 1 0 0 0 1 4-4ring9.dat
  [1,16,0,0,0,1,0,0,0,1,0,0,0,1, ldraw_lib__4_4ring9()],
];
module ldraw_lib__s__98138s01(step=0, col=false, unit=2/5, alt=false, line=0.2, solid=!$preview)
    makepoly(ldraw_lib__s__98138s01(), step=step, col=col, unit=unit, alt=alt, line=line, solid=solid);
ldraw_lib__s__98138s01(line=0.2);
// file: ../p/4-4ering.scad
use <../lib.scad>
use <1-16chrd.scad>
function ldraw_lib__4_4ering() = [
// 0 Adapter Ring Triangles to Normal 1.0
// 0 Name: 4-4ering.dat
// 0 Author: Philippe Hurbain [Philo]
// 0 !LDRAW_ORG Primitive UPDATE 2015-01
// 0 !LICENSE Licensed under CC BY 4.0 : see CAreadme.txt
// 
// 0 BFC CERTIFY CCW
  [0,"BFC","CERTIFY"],
  [0,"BFC","CCW"],
// 
// 0 !HISTORY 2015-10-11 [PTadmin] Official Update 2015-01
// 
// 
// 0 // This file uses 1-16chrd (actually empty). It allows
// 0 // tools to do primitives substition and fill in a ring of chrd here,
// 0 // or, if desired, to substitute this with the hi-res 48\1-16chrd.
// 0 // This file is based on an idea by Darats at http://forums.ldraw.org/read.php?19,14500,14500#msg-14500
// 
// 1 16 0 0 0 1 0 0 0 1 0 0 0 1 1-16chrd.dat
  [1,16,0,0,0,1,0,0,0,1,0,0,0,1, ldraw_lib__1_16chrd()],
// 1 16 0 0 0 0.92388 0 0.38268 0 1 0 -0.38268 0 0.92388 1-16chrd.dat
  [1,16,0,0,0,0.92388,0,0.38268,0,1,0,-0.38268,0,0.92388, ldraw_lib__1_16chrd()],
// 1 16 0 0 0 0.70711 0 0.70711 0 1 0 -0.70711 0 0.70711 1-16chrd.dat
  [1,16,0,0,0,0.70711,0,0.70711,0,1,0,-0.70711,0,0.70711, ldraw_lib__1_16chrd()],
// 1 16 0 0 0 0.38268 0 0.92388 0 1 0 -0.92388 0 0.38268 1-16chrd.dat
  [1,16,0,0,0,0.38268,0,0.92388,0,1,0,-0.92388,0,0.38268, ldraw_lib__1_16chrd()],
// 1 16 0 0 0 0 0 1 0 1 0 -1 0 0 1-16chrd.dat
  [1,16,0,0,0,0,0,1,0,1,0,-1,0,0, ldraw_lib__1_16chrd()],
// 1 16 0 0 0 -0.38268 0 0.92388 0 1 0 -0.92388 0 -0.38268 1-16chrd.dat
  [1,16,0,0,0,-0.38268,0,0.92388,0,1,0,-0.92388,0,-0.38268, ldraw_lib__1_16chrd()],
// 1 16 0 0 0 -0.70711 0 0.70711 0 1 0 -0.70711 0 -0.70711 1-16chrd.dat
  [1,16,0,0,0,-0.70711,0,0.70711,0,1,0,-0.70711,0,-0.70711, ldraw_lib__1_16chrd()],
// 1 16 0 0 0 -0.92388 0 0.38268 0 1 0 -0.38268 0 -0.92388 1-16chrd.dat
  [1,16,0,0,0,-0.92388,0,0.38268,0,1,0,-0.38268,0,-0.92388, ldraw_lib__1_16chrd()],
// 1 16 0 0 0 0 0 -1 0 1 0 1 0 0 1-16chrd.dat
  [1,16,0,0,0,0,0,-1,0,1,0,1,0,0, ldraw_lib__1_16chrd()],
// 1 16 0 0 0 0.38268 0 -0.92388 0 1 0 0.92388 0 0.38268 1-16chrd.dat
  [1,16,0,0,0,0.38268,0,-0.92388,0,1,0,0.92388,0,0.38268, ldraw_lib__1_16chrd()],
// 1 16 0 0 0 0.70711 0 -0.70711 0 1 0 0.70711 0 0.70711 1-16chrd.dat
  [1,16,0,0,0,0.70711,0,-0.70711,0,1,0,0.70711,0,0.70711, ldraw_lib__1_16chrd()],
// 1 16 0 0 0 0.92388 0 -0.38268 0 1 0 0.38268 0 0.92388 1-16chrd.dat
  [1,16,0,0,0,0.92388,0,-0.38268,0,1,0,0.38268,0,0.92388, ldraw_lib__1_16chrd()],
// 1 16 0 0 0 -1 0 0 0 1 0 0 0 -1 1-16chrd.dat
  [1,16,0,0,0,-1,0,0,0,1,0,0,0,-1, ldraw_lib__1_16chrd()],
// 1 16 0 0 0 -0.92388 0 -0.38268 0 1 0 0.38268 0 -0.92388 1-16chrd.dat
  [1,16,0,0,0,-0.92388,0,-0.38268,0,1,0,0.38268,0,-0.92388, ldraw_lib__1_16chrd()],
// 1 16 0 0 0 -0.70711 0 -0.70711 0 1 0 0.70711 0 -0.70711 1-16chrd.dat
  [1,16,0,0,0,-0.70711,0,-0.70711,0,1,0,0.70711,0,-0.70711, ldraw_lib__1_16chrd()],
// 1 16 0 0 0 -0.38268 0 -0.92388 0 1 0 0.92388 0 -0.38268 1-16chrd.dat
  [1,16,0,0,0,-0.38268,0,-0.92388,0,1,0,0.92388,0,-0.38268, ldraw_lib__1_16chrd()],
];
module ldraw_lib__4_4ering(step=0, col=false, unit=2/5, alt=false, line=0.2, solid=!$preview)
    makepoly(ldraw_lib__4_4ering(), step=step, col=col, unit=unit, alt=alt, line=line, solid=solid);
ldraw_lib__4_4ering(line=0.2);
// main file
use <../lib.scad>
use <../p/4-4ering.scad>
use <s/98138s01.scad>
function ldraw_lib__98138p2i() = [
// 0 Tile  1 x  1 Round with Black Heart Pattern
// 0 Name: 98138p2i.dat
// 0 Author: Vincent Messenet [Cheenzo]
// 0 !LDRAW_ORG Part UPDATE 2024-06
// 0 !LICENSE Licensed under CC BY 4.0 : see CAreadme.txt
// 
// 0 BFC CERTIFY CCW
  [0,"BFC","CERTIFY"],
  [0,"BFC","CCW"],
// 
// 0 !KEYWORDS Bricklink 98138pb362, BrickOwl 866365, Rebrickable 98138pr9979
// 0 !KEYWORDS Set 11027, Set 11028, Set 11031, Set 11033
// 
// 0 !HISTORY 2024-07-29 [OrionP] Official Update 2024-06
// 
// 1 16 0 0 0 1 0 0 0 1 0 0 0 1 s\98138s01.dat
  [1,16,0,0,0,1,0,0,0,1,0,0,0,1, ldraw_lib__s__98138s01()],
// 1 16 0 0 0 9 0 0 0 1 0 0 0 9 4-4ering.dat
  [1,16,0,0,0,9,0,0,0,1,0,0,0,9, ldraw_lib__4_4ering()],
// 4 0 3.24 0 5.16 7.37 0 3.46 6.99 0 4.08 3.7 0 5.28
  [4,0,3.24,0,5.16,7.37,0,3.46,6.99,0,4.08,3.7,0,5.28],
// 4 0 7.45 0 .15 .12 0 3.16 6.79 0 -.97 7.13 0 -.47
  [4,0,7.45,0,.15,.12,0,3.16,6.79,0,-.97,7.13,0,-.47],
// 4 0 5.14 0 5.28 4.4 0 5.35 6.29 0 4.78 5.71 0 5.08
  [4,0,5.14,0,5.28,4.4,0,5.35,6.29,0,4.78,5.71,0,5.08],
// 4 0 6.29 0 4.78 4.4 0 5.35 3.7 0 5.28 6.99 0 4.08
  [4,0,6.29,0,4.78,4.4,0,5.35,3.7,0,5.28,6.99,0,4.08],
// 4 0 7.37 0 3.46 3.24 0 5.16 2.7 0 4.96 7.6 0 2.81
  [4,0,7.37,0,3.46,3.24,0,5.16,2.7,0,4.96,7.6,0,2.81],
// 4 0 7.63 0 .76 7.72 0 1.22 1.24 0 4.12 .66 0 3.66
  [4,0,7.63,0,.76,7.72,0,1.22,1.24,0,4.12,.66,0,3.66],
// 4 0 1.94 0 4.58 1.24 0 4.12 7.72 0 1.22 7.72 0 2.23
  [4,0,1.94,0,4.58,1.24,0,4.12,7.72,0,1.22,7.72,0,2.23],
// 4 0 2.7 0 4.96 1.94 0 4.58 7.72 0 2.23 7.6 0 2.81
  [4,0,2.7,0,4.96,1.94,0,4.58,7.72,0,2.23,7.6,0,2.81],
// 4 0 .66 0 3.66 .12 0 3.16 7.45 0 .15 7.63 0 .76
  [4,0,.66,0,3.66,.12,0,3.16,7.45,0,.15,7.63,0,.76],
// 4 0 .45 0 -7.85 .82 0 -7.67 -.15 0 -7.72 .15 0 -7.85
  [4,0,.45,0,-7.85,.82,0,-7.67,-.15,0,-7.72,.15,0,-7.85],
// 4 0 6.79 0 -.97 .12 0 3.16 -.15 0 -7.72 .82 0 -7.67
  [4,0,6.79,0,-.97,.12,0,3.16,-.15,0,-7.72,.82,0,-7.67],
// 4 0 -.15 0 -7.72 .12 0 3.16 -1.07 0 3.96 -6.32 0 -.86
  [4,0,-.15,0,-7.72,.12,0,3.16,-1.07,0,3.96,-6.32,0,-.86],
// 4 0 -1.07 0 3.96 -2.23 0 4.81 -6.78 0 -.24 -6.32 0 -.86
  [4,0,-1.07,0,3.96,-2.23,0,4.81,-6.78,0,-.24,-6.32,0,-.86],
// 4 0 -6.78 0 -.24 -2.23 0 4.81 -2.77 0 5.12 -7.24 0 .73
  [4,0,-6.78,0,-.24,-2.23,0,4.81,-2.77,0,5.12,-7.24,0,.73],
// 4 0 -7.43 0 1.46 -7.24 0 .73 -2.77 0 5.12 -3.35 0 5.35
  [4,0,-7.43,0,1.46,-7.24,0,.73,-2.77,0,5.12,-3.35,0,5.35],
// 4 0 -3.93 0 5.47 -7.47 0 2.34 -7.43 0 1.46 -3.35 0 5.35
  [4,0,-3.93,0,5.47,-7.47,0,2.34,-7.43,0,1.46,-3.35,0,5.35],
// 4 0 -7.47 0 2.34 -3.93 0 5.47 -4.77 0 5.47 -7.36 0 3.04
  [4,0,-7.47,0,2.34,-3.93,0,5.47,-4.77,0,5.47,-7.36,0,3.04],
// 4 0 -7.13 0 3.66 -7.36 0 3.04 -4.77 0 5.47 -5.35 0 5.31
  [4,0,-7.13,0,3.66,-7.36,0,3.04,-4.77,0,5.47,-5.35,0,5.31],
// 3 0 -5.35 0 5.31 -6.05 0 4.96 -7.13 0 3.66
  [3,0,-5.35,0,5.31,-6.05,0,4.96,-7.13,0,3.66],
// 4 0 -6.47 0 4.58 -6.81 0 4.19 -7.13 0 3.66 -6.05 0 4.96
  [4,0,-6.47,0,4.58,-6.81,0,4.19,-7.13,0,3.66,-6.05,0,4.96],
// 4 16 0 0 9 -3.35 0 5.35 -2.77 0 5.12 3.24 0 5.16
  [4,16,0,0,9,-3.35,0,5.35,-2.77,0,5.12,3.24,0,5.16],
// 4 16 3.24 0 5.16 -2.77 0 5.12 -2.23 0 4.81 2.7 0 4.96
  [4,16,3.24,0,5.16,-2.77,0,5.12,-2.23,0,4.81,2.7,0,4.96],
// 4 16 1.94 0 4.58 -2.23 0 4.81 -1.07 0 3.96 1.24 0 4.12
  [4,16,1.94,0,4.58,-2.23,0,4.81,-1.07,0,3.96,1.24,0,4.12],
// 3 16 -1.07 0 3.96 .12 0 3.16 .66 0 3.66
  [3,16,-1.07,0,3.96,.12,0,3.16,.66,0,3.66],
// 3 16 .66 0 3.66 1.24 0 4.12 -1.07 0 3.96
  [3,16,.66,0,3.66,1.24,0,4.12,-1.07,0,3.96],
// 3 16 1.94 0 4.58 2.7 0 4.96 -2.23 0 4.81
  [3,16,1.94,0,4.58,2.7,0,4.96,-2.23,0,4.81],
// 4 16 3.4443 0 8.3151 0 0 9 3.24 0 5.16 3.7 0 5.28
  [4,16,3.4443,0,8.3151,0,0,9,3.24,0,5.16,3.7,0,5.28],
// 4 16 6.3639 0 6.3639 3.4443 0 8.3151 3.7 0 5.28 4.4 0 5.35
  [4,16,6.3639,0,6.3639,3.4443,0,8.3151,3.7,0,5.28,4.4,0,5.35],
// 3 16 6.3639 0 6.3639 4.4 0 5.35 5.14 0 5.28
  [3,16,6.3639,0,6.3639,4.4,0,5.35,5.14,0,5.28],
// 3 16 6.3639 0 6.3639 5.14 0 5.28 5.71 0 5.08
  [3,16,6.3639,0,6.3639,5.14,0,5.28,5.71,0,5.08],
// 3 16 6.3639 0 6.3639 5.71 0 5.08 6.29 0 4.78
  [3,16,6.3639,0,6.3639,5.71,0,5.08,6.29,0,4.78],
// 4 16 8.3151 0 3.4443 6.3639 0 6.3639 6.29 0 4.78 6.99 0 4.08
  [4,16,8.3151,0,3.4443,6.3639,0,6.3639,6.29,0,4.78,6.99,0,4.08],
// 3 16 8.3151 0 3.4443 6.99 0 4.08 7.37 0 3.46
  [3,16,8.3151,0,3.4443,6.99,0,4.08,7.37,0,3.46],
// 3 16 7.37 0 3.46 7.6 0 2.81 8.3151 0 3.4443
  [3,16,7.37,0,3.46,7.6,0,2.81,8.3151,0,3.4443],
// 4 16 9 0 0 8.3151 0 3.4443 7.6 0 2.81 7.72 0 2.23
  [4,16,9,0,0,8.3151,0,3.4443,7.6,0,2.81,7.72,0,2.23],
// 3 16 9 0 0 7.72 0 2.23 7.72 0 1.22
  [3,16,9,0,0,7.72,0,2.23,7.72,0,1.22],
// 3 16 7.63 0 .76 9 0 0 7.72 0 1.22
  [3,16,7.63,0,.76,9,0,0,7.72,0,1.22],
// 4 16 7.63 0 .76 7.45 0 .15 8.3151 0 -3.4443 9 0 0
  [4,16,7.63,0,.76,7.45,0,.15,8.3151,0,-3.4443,9,0,0],
// 3 16 8.3151 0 -3.4443 7.45 0 .15 7.13 0 -.47
  [3,16,8.3151,0,-3.4443,7.45,0,.15,7.13,0,-.47],
// 4 16 6.3639 0 -6.3639 8.3151 0 -3.4443 7.13 0 -.47 6.79 0 -.97
  [4,16,6.3639,0,-6.3639,8.3151,0,-3.4443,7.13,0,-.47,6.79,0,-.97],
// 4 16 3.4443 0 -8.3151 6.3639 0 -6.3639 6.79 0 -.97 .82 0 -7.67
  [4,16,3.4443,0,-8.3151,6.3639,0,-6.3639,6.79,0,-.97,.82,0,-7.67],
// 4 16 3.4443 0 -8.3151 .82 0 -7.67 .45 0 -7.85 0 0 -9
  [4,16,3.4443,0,-8.3151,.82,0,-7.67,.45,0,-7.85,0,0,-9],
// 4 16 .45 0 -7.85 .15 0 -7.85 -3.4443 0 -8.3151 0 0 -9
  [4,16,.45,0,-7.85,.15,0,-7.85,-3.4443,0,-8.3151,0,0,-9],
// 4 16 -6.3639 0 -6.3639 -3.4443 0 -8.3151 .15 0 -7.85 -.15 0 -7.72
  [4,16,-6.3639,0,-6.3639,-3.4443,0,-8.3151,.15,0,-7.85,-.15,0,-7.72],
// 4 16 -8.3151 0 -3.4443 -6.3639 0 -6.3639 -.15 0 -7.72 -6.32 0 -.86
  [4,16,-8.3151,0,-3.4443,-6.3639,0,-6.3639,-.15,0,-7.72,-6.32,0,-.86],
// 4 16 -6.32 0 -.86 -6.78 0 -.24 -9 0 0 -8.3151 0 -3.4443
  [4,16,-6.32,0,-.86,-6.78,0,-.24,-9,0,0,-8.3151,0,-3.4443],
// 3 16 -9 0 0 -6.78 0 -.24 -7.24 0 .73
  [3,16,-9,0,0,-6.78,0,-.24,-7.24,0,.73],
// 4 16 -8.3151 0 3.4443 -9 0 0 -7.24 0 .73 -7.43 0 1.46
  [4,16,-8.3151,0,3.4443,-9,0,0,-7.24,0,.73,-7.43,0,1.46],
// 3 16 -8.3151 0 3.4443 -7.43 0 1.46 -7.47 0 2.34
  [3,16,-8.3151,0,3.4443,-7.43,0,1.46,-7.47,0,2.34],
// 3 16 -8.3151 0 3.4443 -7.47 0 2.34 -7.36 0 3.04
  [3,16,-8.3151,0,3.4443,-7.47,0,2.34,-7.36,0,3.04],
// 3 16 -8.3151 0 3.4443 -7.36 0 3.04 -7.13 0 3.66
  [3,16,-8.3151,0,3.4443,-7.36,0,3.04,-7.13,0,3.66],
// 4 16 -6.3639 0 6.3639 -8.3151 0 3.4443 -7.13 0 3.66 -6.81 0 4.19
  [4,16,-6.3639,0,6.3639,-8.3151,0,3.4443,-7.13,0,3.66,-6.81,0,4.19],
// 3 16 -6.3639 0 6.3639 -6.81 0 4.19 -6.47 0 4.58
  [3,16,-6.3639,0,6.3639,-6.81,0,4.19,-6.47,0,4.58],
// 3 16 -6.3639 0 6.3639 -6.47 0 4.58 -6.05 0 4.96
  [3,16,-6.3639,0,6.3639,-6.47,0,4.58,-6.05,0,4.96],
// 3 16 -6.05 0 4.96 -5.35 0 5.31 -6.3639 0 6.3639
  [3,16,-6.05,0,4.96,-5.35,0,5.31,-6.3639,0,6.3639],
// 4 16 -3.4443 0 8.3151 -6.3639 0 6.3639 -5.35 0 5.31 -4.77 0 5.47
  [4,16,-3.4443,0,8.3151,-6.3639,0,6.3639,-5.35,0,5.31,-4.77,0,5.47],
// 4 16 -4.77 0 5.47 -3.93 0 5.47 0 0 9 -3.4443 0 8.3151
  [4,16,-4.77,0,5.47,-3.93,0,5.47,0,0,9,-3.4443,0,8.3151],
// 3 16 0 0 9 -3.93 0 5.47 -3.35 0 5.35
  [3,16,0,0,9,-3.93,0,5.47,-3.35,0,5.35],
];
module ldraw_lib__98138p2i(step=0, col=false, unit=2/5, alt=false, line=0.2, solid=!$preview)
    makepoly(ldraw_lib__98138p2i(), step=step, col=col, unit=unit, alt=alt, line=line, solid=solid);
ldraw_lib__98138p2i(line=0.2);
